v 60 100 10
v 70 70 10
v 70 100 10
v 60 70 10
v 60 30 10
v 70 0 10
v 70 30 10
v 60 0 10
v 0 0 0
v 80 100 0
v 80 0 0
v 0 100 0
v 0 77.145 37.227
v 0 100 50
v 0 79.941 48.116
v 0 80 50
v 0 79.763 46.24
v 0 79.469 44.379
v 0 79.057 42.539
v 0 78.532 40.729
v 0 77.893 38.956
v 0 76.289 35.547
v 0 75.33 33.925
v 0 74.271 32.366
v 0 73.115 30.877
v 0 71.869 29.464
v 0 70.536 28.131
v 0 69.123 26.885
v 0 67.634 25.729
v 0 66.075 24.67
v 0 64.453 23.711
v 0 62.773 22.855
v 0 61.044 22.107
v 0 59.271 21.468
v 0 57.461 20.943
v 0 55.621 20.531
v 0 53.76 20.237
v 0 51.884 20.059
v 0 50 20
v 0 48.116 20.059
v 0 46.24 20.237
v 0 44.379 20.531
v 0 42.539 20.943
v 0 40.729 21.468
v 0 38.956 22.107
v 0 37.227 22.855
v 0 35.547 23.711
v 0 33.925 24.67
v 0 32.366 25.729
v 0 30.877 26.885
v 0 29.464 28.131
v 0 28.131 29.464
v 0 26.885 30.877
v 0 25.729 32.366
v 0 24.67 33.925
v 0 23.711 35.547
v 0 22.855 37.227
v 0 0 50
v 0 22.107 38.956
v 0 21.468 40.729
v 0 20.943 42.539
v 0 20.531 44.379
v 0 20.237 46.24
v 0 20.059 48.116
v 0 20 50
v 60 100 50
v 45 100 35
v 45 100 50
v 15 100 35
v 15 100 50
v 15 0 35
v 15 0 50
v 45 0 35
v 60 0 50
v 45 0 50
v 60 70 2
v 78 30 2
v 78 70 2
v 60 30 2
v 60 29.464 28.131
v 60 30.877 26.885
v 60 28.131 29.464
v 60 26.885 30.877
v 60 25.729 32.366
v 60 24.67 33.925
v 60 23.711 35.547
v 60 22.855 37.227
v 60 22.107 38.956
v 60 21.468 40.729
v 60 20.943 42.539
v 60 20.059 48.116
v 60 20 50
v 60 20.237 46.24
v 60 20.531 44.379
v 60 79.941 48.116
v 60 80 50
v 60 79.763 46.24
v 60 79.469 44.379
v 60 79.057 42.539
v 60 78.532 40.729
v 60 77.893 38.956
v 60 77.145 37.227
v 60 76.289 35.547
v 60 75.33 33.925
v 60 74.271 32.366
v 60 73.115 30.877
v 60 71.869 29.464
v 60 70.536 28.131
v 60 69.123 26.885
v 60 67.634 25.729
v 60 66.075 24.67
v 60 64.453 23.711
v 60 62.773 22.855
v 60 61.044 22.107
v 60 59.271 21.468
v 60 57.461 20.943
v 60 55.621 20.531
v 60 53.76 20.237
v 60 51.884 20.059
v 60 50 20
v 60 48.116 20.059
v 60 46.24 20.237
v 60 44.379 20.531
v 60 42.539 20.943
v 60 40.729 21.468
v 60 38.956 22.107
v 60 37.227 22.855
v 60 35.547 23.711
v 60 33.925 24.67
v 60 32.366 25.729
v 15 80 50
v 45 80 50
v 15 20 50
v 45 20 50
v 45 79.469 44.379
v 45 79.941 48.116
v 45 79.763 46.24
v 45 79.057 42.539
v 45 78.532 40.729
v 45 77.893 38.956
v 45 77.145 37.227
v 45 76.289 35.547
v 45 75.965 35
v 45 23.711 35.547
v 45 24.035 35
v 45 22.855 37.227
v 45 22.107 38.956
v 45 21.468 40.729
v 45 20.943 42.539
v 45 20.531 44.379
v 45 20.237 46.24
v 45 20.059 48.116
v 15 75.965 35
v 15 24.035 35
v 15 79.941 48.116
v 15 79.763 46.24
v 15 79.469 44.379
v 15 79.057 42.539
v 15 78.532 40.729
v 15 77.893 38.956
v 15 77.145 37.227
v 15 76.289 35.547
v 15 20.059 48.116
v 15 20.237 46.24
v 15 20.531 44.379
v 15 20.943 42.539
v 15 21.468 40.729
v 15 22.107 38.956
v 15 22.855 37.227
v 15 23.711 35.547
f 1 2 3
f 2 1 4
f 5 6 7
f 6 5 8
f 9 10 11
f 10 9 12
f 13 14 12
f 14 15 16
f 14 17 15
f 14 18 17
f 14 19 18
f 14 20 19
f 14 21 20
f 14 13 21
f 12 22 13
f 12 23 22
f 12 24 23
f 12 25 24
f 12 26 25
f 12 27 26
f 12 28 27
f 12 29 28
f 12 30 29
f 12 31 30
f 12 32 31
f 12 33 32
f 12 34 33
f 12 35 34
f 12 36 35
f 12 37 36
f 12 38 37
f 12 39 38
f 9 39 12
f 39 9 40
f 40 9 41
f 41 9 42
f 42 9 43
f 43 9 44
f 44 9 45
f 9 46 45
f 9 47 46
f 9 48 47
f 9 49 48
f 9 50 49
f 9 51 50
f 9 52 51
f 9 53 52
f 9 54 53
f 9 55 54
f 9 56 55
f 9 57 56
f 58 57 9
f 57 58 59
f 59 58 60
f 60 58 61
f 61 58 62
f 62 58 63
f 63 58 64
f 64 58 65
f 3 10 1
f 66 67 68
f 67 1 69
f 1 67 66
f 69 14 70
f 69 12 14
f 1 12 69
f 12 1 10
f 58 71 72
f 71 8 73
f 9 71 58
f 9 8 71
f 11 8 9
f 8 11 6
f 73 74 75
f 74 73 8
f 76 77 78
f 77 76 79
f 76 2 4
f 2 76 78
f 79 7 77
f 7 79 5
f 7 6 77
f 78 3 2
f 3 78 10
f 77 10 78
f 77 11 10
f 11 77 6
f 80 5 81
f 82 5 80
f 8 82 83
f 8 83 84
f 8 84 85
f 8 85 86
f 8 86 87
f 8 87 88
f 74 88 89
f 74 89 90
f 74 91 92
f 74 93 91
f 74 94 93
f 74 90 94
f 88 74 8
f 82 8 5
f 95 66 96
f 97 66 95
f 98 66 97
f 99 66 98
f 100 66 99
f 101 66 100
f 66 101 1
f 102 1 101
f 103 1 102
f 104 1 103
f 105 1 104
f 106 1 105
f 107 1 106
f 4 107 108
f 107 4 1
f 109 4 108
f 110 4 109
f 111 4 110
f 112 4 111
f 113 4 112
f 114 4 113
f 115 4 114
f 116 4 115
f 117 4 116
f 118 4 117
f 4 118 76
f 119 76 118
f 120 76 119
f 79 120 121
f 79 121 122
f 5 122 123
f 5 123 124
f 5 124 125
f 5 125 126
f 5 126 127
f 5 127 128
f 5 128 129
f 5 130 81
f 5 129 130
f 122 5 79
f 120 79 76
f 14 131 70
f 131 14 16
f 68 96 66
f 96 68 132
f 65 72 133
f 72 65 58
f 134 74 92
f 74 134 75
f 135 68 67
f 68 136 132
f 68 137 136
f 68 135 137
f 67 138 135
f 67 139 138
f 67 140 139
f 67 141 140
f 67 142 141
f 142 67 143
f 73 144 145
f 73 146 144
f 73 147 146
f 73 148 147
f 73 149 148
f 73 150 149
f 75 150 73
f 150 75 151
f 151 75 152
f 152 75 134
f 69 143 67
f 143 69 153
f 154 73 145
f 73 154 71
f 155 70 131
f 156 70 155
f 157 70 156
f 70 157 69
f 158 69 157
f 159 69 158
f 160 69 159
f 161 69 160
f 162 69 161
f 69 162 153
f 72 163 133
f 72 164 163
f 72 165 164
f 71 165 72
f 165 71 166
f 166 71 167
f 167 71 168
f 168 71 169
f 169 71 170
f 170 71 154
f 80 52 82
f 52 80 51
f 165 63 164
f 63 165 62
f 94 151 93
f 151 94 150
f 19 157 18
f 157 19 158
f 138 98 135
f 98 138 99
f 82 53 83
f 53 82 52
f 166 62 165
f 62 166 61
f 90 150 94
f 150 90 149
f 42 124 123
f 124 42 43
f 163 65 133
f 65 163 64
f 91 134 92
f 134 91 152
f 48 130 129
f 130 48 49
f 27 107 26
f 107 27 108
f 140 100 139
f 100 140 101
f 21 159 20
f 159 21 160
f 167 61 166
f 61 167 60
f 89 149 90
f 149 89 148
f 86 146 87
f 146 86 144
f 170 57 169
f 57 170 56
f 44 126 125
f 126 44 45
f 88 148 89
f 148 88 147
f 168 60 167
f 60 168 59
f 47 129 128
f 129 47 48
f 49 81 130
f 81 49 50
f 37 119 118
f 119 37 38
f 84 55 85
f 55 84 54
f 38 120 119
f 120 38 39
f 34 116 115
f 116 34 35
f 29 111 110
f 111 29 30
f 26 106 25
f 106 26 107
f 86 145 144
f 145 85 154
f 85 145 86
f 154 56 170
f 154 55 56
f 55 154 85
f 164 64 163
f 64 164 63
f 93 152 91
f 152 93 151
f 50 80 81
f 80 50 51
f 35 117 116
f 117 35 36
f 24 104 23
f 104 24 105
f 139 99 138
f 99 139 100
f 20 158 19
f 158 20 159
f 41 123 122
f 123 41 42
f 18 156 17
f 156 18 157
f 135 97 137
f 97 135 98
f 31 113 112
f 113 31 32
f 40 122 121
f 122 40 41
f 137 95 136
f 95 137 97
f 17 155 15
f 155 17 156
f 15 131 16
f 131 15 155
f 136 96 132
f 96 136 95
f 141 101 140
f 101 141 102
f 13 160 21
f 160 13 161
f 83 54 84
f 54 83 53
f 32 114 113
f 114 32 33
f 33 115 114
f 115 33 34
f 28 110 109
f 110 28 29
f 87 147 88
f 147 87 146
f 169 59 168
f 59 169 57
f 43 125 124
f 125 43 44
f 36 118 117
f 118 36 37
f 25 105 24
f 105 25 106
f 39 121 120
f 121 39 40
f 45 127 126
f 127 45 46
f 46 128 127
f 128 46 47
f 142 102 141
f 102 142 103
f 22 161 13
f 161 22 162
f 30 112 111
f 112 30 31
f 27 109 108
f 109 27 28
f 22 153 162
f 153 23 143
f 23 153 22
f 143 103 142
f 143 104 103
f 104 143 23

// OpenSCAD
// file: Library_2021.scad
$fn = 100;//This number should normally be around or at 100.


//===========================================================================================================================
//===========================================================================================================================
module sqaure_torus(outerXlength, outerYlength, innerXlength, innerYlength, obritalDis, angleHere){//Sqaure torus
rotate_extrude(angle = angleHere,convexity = 10){
translate([obritalDis + outerXlength / 2, outerYlength / 2, 0])
    difference(){
        square([outerXlength, outerYlength], center = true);
        square([innerXlength, innerYlength], center = true);
        
        }
    }
}
//===========================================================================================================================
//===========================================================================================================================
module torus(outerRadius, innerRadius, orbitalDistance, angleHere){// Donut shape
    rotate_extrude(angle= angleHere, convexity= 10){
        translate([orbitalDistance, 0, 0])
            difference(){
                circle(outerRadius);
                circle(innerRadius);
                }
        }
    assert(angleHere <= 360, "angle is greater than 360!");
    assert(outerRadius > innerRadius, "Inner circle is greater than outer circle!");
    assert(orbitalDistance > 0, "orbital radius is less than zero!");
    }
//===========================================================================================================================
//===========================================================================================================================
module orbital_cylinders(OrbitalRadius, NumberOfCylinders, cylinderRadius, Height, Xtilt, Ytilt){// cuts circles in a circle
    for (Hole = [0:NumberOfCylinders]){
        rotate([0, 0, 360/NumberOfCylinders])
        translate([OrbitalRadius, 0, 0])
        rotate([Xtilt, Ytilt,0])
            cylinder(Height, r= cylinderRadius);
        }
    }
//===========================================================================================================================
//===========================================================================================================================
module annulus(OuterRadius, InnerRadius, Height){//Pipe shape
    differnce(){
        //Prime object
        cylinder(Height, r= OuterRadius);
        //Cutting object(s)
        cylinder(Height, r= InnerRadius);
        }
    }
//==========================================================================================================================
//==========================================================================================================================
module ceinture(OuterRadius, InnerRadius, Height, BetweenCenters){// Belt shape
    difference(){
        hull(){//Prime object
            cylinder(Height, r= outerRadius);
            translate([BetweenCenters, 0, 0])
                cylinder(Height, r= outerRadius);
            }
        hull(){//Cutting object
            cylinder(Height, r= InnerRadius);
            translate([BetweenCenters, 0, 0])
                cylinder(Height, r= InnerRadius);
            }
        }
    }
//==========================================================================================================================
//==========================================================================================================================
module triangle(type, leg_a, leg_b,hypotenuse){// draws right, scalene, isosceles and equilateral triangles
    if(type == "right"){
        polygon( points = [[0, 0],[leg_a, 0],[0, leg_b]]);
            }
        else if(type == "scalene"){
            hypotenuse = sqrt(pow(leg_a, 2) + pow(leg_b, 2));
                polygon(points = [[0,-(leg_a/2)],[leg_b,0],[0,hypotenuse]]);
            }
        else if(type == "isosceles"){
                polygon(points = [[0,-(leg_a/2)],[leg_b,0],[0,(leg_a/2)]]);
            }
        else if(type == "equilateral"){
                polygon(points = [[0,-(leg_a/2)],[leg_a,0],[0,leg_a]]);
            }
    }
//==========================================================================================================================
//==========================================================================================================================
module _name_(){}
//==========================================================================================================================
//==========================================================================================================================
module _name_(){}
//==========================================================================================================================
//==========================================================================================================================
module _name_(){}
//==========================================================================================================================
//==========================================================================================================================
// main file
$fn = 100;
mm = 1;
degree = 1;
diameter = .5;
use <Library_2021.scad>

Part_137();

module Part_137(){
    baseCube();
        Length = 60 * mm;
        Width = 100 * mm;    
    module baseCube(){
        Step();

        Height = 50 * mm;
            difference(){
                cutWidth = 30 * mm;
                cutHeight = 15 * mm;
                cutRadius = 30 * mm;
                cube([Length, Width, Height]);
                    Xoffset = 15 * mm;
                    translate([Xoffset, 0, Height - cutHeight])
                        cube([cutWidth, Width, cutHeight]);
                    translate([0, Width / 2, Height])
                    rotate([-90, 0, -90])
                        cylinder(Length, r= cutRadius);
                }
    }                
    module Step(){
        foot = 20 * mm;
        footHeight = 10 * mm;
        Yoffset = 30 * mm;
        Zoffset = 2 * mm;
        FootCutWidth = 40 * mm;
        difference(){
            cube([Length + foot, Width, footHeight]);// the cube that is foot.
            translate([0, Yoffset, Zoffset])
                cube([Length + foot, FootCutWidth, footHeight]);// Center cube cut on the foot
            translate([Length + foot, Width, 0])
             rotate([0, -45, 180])
                cube([Length + foot, Width, footHeight]);// Does the sloped cut on the foot
            }
        }
            

}
